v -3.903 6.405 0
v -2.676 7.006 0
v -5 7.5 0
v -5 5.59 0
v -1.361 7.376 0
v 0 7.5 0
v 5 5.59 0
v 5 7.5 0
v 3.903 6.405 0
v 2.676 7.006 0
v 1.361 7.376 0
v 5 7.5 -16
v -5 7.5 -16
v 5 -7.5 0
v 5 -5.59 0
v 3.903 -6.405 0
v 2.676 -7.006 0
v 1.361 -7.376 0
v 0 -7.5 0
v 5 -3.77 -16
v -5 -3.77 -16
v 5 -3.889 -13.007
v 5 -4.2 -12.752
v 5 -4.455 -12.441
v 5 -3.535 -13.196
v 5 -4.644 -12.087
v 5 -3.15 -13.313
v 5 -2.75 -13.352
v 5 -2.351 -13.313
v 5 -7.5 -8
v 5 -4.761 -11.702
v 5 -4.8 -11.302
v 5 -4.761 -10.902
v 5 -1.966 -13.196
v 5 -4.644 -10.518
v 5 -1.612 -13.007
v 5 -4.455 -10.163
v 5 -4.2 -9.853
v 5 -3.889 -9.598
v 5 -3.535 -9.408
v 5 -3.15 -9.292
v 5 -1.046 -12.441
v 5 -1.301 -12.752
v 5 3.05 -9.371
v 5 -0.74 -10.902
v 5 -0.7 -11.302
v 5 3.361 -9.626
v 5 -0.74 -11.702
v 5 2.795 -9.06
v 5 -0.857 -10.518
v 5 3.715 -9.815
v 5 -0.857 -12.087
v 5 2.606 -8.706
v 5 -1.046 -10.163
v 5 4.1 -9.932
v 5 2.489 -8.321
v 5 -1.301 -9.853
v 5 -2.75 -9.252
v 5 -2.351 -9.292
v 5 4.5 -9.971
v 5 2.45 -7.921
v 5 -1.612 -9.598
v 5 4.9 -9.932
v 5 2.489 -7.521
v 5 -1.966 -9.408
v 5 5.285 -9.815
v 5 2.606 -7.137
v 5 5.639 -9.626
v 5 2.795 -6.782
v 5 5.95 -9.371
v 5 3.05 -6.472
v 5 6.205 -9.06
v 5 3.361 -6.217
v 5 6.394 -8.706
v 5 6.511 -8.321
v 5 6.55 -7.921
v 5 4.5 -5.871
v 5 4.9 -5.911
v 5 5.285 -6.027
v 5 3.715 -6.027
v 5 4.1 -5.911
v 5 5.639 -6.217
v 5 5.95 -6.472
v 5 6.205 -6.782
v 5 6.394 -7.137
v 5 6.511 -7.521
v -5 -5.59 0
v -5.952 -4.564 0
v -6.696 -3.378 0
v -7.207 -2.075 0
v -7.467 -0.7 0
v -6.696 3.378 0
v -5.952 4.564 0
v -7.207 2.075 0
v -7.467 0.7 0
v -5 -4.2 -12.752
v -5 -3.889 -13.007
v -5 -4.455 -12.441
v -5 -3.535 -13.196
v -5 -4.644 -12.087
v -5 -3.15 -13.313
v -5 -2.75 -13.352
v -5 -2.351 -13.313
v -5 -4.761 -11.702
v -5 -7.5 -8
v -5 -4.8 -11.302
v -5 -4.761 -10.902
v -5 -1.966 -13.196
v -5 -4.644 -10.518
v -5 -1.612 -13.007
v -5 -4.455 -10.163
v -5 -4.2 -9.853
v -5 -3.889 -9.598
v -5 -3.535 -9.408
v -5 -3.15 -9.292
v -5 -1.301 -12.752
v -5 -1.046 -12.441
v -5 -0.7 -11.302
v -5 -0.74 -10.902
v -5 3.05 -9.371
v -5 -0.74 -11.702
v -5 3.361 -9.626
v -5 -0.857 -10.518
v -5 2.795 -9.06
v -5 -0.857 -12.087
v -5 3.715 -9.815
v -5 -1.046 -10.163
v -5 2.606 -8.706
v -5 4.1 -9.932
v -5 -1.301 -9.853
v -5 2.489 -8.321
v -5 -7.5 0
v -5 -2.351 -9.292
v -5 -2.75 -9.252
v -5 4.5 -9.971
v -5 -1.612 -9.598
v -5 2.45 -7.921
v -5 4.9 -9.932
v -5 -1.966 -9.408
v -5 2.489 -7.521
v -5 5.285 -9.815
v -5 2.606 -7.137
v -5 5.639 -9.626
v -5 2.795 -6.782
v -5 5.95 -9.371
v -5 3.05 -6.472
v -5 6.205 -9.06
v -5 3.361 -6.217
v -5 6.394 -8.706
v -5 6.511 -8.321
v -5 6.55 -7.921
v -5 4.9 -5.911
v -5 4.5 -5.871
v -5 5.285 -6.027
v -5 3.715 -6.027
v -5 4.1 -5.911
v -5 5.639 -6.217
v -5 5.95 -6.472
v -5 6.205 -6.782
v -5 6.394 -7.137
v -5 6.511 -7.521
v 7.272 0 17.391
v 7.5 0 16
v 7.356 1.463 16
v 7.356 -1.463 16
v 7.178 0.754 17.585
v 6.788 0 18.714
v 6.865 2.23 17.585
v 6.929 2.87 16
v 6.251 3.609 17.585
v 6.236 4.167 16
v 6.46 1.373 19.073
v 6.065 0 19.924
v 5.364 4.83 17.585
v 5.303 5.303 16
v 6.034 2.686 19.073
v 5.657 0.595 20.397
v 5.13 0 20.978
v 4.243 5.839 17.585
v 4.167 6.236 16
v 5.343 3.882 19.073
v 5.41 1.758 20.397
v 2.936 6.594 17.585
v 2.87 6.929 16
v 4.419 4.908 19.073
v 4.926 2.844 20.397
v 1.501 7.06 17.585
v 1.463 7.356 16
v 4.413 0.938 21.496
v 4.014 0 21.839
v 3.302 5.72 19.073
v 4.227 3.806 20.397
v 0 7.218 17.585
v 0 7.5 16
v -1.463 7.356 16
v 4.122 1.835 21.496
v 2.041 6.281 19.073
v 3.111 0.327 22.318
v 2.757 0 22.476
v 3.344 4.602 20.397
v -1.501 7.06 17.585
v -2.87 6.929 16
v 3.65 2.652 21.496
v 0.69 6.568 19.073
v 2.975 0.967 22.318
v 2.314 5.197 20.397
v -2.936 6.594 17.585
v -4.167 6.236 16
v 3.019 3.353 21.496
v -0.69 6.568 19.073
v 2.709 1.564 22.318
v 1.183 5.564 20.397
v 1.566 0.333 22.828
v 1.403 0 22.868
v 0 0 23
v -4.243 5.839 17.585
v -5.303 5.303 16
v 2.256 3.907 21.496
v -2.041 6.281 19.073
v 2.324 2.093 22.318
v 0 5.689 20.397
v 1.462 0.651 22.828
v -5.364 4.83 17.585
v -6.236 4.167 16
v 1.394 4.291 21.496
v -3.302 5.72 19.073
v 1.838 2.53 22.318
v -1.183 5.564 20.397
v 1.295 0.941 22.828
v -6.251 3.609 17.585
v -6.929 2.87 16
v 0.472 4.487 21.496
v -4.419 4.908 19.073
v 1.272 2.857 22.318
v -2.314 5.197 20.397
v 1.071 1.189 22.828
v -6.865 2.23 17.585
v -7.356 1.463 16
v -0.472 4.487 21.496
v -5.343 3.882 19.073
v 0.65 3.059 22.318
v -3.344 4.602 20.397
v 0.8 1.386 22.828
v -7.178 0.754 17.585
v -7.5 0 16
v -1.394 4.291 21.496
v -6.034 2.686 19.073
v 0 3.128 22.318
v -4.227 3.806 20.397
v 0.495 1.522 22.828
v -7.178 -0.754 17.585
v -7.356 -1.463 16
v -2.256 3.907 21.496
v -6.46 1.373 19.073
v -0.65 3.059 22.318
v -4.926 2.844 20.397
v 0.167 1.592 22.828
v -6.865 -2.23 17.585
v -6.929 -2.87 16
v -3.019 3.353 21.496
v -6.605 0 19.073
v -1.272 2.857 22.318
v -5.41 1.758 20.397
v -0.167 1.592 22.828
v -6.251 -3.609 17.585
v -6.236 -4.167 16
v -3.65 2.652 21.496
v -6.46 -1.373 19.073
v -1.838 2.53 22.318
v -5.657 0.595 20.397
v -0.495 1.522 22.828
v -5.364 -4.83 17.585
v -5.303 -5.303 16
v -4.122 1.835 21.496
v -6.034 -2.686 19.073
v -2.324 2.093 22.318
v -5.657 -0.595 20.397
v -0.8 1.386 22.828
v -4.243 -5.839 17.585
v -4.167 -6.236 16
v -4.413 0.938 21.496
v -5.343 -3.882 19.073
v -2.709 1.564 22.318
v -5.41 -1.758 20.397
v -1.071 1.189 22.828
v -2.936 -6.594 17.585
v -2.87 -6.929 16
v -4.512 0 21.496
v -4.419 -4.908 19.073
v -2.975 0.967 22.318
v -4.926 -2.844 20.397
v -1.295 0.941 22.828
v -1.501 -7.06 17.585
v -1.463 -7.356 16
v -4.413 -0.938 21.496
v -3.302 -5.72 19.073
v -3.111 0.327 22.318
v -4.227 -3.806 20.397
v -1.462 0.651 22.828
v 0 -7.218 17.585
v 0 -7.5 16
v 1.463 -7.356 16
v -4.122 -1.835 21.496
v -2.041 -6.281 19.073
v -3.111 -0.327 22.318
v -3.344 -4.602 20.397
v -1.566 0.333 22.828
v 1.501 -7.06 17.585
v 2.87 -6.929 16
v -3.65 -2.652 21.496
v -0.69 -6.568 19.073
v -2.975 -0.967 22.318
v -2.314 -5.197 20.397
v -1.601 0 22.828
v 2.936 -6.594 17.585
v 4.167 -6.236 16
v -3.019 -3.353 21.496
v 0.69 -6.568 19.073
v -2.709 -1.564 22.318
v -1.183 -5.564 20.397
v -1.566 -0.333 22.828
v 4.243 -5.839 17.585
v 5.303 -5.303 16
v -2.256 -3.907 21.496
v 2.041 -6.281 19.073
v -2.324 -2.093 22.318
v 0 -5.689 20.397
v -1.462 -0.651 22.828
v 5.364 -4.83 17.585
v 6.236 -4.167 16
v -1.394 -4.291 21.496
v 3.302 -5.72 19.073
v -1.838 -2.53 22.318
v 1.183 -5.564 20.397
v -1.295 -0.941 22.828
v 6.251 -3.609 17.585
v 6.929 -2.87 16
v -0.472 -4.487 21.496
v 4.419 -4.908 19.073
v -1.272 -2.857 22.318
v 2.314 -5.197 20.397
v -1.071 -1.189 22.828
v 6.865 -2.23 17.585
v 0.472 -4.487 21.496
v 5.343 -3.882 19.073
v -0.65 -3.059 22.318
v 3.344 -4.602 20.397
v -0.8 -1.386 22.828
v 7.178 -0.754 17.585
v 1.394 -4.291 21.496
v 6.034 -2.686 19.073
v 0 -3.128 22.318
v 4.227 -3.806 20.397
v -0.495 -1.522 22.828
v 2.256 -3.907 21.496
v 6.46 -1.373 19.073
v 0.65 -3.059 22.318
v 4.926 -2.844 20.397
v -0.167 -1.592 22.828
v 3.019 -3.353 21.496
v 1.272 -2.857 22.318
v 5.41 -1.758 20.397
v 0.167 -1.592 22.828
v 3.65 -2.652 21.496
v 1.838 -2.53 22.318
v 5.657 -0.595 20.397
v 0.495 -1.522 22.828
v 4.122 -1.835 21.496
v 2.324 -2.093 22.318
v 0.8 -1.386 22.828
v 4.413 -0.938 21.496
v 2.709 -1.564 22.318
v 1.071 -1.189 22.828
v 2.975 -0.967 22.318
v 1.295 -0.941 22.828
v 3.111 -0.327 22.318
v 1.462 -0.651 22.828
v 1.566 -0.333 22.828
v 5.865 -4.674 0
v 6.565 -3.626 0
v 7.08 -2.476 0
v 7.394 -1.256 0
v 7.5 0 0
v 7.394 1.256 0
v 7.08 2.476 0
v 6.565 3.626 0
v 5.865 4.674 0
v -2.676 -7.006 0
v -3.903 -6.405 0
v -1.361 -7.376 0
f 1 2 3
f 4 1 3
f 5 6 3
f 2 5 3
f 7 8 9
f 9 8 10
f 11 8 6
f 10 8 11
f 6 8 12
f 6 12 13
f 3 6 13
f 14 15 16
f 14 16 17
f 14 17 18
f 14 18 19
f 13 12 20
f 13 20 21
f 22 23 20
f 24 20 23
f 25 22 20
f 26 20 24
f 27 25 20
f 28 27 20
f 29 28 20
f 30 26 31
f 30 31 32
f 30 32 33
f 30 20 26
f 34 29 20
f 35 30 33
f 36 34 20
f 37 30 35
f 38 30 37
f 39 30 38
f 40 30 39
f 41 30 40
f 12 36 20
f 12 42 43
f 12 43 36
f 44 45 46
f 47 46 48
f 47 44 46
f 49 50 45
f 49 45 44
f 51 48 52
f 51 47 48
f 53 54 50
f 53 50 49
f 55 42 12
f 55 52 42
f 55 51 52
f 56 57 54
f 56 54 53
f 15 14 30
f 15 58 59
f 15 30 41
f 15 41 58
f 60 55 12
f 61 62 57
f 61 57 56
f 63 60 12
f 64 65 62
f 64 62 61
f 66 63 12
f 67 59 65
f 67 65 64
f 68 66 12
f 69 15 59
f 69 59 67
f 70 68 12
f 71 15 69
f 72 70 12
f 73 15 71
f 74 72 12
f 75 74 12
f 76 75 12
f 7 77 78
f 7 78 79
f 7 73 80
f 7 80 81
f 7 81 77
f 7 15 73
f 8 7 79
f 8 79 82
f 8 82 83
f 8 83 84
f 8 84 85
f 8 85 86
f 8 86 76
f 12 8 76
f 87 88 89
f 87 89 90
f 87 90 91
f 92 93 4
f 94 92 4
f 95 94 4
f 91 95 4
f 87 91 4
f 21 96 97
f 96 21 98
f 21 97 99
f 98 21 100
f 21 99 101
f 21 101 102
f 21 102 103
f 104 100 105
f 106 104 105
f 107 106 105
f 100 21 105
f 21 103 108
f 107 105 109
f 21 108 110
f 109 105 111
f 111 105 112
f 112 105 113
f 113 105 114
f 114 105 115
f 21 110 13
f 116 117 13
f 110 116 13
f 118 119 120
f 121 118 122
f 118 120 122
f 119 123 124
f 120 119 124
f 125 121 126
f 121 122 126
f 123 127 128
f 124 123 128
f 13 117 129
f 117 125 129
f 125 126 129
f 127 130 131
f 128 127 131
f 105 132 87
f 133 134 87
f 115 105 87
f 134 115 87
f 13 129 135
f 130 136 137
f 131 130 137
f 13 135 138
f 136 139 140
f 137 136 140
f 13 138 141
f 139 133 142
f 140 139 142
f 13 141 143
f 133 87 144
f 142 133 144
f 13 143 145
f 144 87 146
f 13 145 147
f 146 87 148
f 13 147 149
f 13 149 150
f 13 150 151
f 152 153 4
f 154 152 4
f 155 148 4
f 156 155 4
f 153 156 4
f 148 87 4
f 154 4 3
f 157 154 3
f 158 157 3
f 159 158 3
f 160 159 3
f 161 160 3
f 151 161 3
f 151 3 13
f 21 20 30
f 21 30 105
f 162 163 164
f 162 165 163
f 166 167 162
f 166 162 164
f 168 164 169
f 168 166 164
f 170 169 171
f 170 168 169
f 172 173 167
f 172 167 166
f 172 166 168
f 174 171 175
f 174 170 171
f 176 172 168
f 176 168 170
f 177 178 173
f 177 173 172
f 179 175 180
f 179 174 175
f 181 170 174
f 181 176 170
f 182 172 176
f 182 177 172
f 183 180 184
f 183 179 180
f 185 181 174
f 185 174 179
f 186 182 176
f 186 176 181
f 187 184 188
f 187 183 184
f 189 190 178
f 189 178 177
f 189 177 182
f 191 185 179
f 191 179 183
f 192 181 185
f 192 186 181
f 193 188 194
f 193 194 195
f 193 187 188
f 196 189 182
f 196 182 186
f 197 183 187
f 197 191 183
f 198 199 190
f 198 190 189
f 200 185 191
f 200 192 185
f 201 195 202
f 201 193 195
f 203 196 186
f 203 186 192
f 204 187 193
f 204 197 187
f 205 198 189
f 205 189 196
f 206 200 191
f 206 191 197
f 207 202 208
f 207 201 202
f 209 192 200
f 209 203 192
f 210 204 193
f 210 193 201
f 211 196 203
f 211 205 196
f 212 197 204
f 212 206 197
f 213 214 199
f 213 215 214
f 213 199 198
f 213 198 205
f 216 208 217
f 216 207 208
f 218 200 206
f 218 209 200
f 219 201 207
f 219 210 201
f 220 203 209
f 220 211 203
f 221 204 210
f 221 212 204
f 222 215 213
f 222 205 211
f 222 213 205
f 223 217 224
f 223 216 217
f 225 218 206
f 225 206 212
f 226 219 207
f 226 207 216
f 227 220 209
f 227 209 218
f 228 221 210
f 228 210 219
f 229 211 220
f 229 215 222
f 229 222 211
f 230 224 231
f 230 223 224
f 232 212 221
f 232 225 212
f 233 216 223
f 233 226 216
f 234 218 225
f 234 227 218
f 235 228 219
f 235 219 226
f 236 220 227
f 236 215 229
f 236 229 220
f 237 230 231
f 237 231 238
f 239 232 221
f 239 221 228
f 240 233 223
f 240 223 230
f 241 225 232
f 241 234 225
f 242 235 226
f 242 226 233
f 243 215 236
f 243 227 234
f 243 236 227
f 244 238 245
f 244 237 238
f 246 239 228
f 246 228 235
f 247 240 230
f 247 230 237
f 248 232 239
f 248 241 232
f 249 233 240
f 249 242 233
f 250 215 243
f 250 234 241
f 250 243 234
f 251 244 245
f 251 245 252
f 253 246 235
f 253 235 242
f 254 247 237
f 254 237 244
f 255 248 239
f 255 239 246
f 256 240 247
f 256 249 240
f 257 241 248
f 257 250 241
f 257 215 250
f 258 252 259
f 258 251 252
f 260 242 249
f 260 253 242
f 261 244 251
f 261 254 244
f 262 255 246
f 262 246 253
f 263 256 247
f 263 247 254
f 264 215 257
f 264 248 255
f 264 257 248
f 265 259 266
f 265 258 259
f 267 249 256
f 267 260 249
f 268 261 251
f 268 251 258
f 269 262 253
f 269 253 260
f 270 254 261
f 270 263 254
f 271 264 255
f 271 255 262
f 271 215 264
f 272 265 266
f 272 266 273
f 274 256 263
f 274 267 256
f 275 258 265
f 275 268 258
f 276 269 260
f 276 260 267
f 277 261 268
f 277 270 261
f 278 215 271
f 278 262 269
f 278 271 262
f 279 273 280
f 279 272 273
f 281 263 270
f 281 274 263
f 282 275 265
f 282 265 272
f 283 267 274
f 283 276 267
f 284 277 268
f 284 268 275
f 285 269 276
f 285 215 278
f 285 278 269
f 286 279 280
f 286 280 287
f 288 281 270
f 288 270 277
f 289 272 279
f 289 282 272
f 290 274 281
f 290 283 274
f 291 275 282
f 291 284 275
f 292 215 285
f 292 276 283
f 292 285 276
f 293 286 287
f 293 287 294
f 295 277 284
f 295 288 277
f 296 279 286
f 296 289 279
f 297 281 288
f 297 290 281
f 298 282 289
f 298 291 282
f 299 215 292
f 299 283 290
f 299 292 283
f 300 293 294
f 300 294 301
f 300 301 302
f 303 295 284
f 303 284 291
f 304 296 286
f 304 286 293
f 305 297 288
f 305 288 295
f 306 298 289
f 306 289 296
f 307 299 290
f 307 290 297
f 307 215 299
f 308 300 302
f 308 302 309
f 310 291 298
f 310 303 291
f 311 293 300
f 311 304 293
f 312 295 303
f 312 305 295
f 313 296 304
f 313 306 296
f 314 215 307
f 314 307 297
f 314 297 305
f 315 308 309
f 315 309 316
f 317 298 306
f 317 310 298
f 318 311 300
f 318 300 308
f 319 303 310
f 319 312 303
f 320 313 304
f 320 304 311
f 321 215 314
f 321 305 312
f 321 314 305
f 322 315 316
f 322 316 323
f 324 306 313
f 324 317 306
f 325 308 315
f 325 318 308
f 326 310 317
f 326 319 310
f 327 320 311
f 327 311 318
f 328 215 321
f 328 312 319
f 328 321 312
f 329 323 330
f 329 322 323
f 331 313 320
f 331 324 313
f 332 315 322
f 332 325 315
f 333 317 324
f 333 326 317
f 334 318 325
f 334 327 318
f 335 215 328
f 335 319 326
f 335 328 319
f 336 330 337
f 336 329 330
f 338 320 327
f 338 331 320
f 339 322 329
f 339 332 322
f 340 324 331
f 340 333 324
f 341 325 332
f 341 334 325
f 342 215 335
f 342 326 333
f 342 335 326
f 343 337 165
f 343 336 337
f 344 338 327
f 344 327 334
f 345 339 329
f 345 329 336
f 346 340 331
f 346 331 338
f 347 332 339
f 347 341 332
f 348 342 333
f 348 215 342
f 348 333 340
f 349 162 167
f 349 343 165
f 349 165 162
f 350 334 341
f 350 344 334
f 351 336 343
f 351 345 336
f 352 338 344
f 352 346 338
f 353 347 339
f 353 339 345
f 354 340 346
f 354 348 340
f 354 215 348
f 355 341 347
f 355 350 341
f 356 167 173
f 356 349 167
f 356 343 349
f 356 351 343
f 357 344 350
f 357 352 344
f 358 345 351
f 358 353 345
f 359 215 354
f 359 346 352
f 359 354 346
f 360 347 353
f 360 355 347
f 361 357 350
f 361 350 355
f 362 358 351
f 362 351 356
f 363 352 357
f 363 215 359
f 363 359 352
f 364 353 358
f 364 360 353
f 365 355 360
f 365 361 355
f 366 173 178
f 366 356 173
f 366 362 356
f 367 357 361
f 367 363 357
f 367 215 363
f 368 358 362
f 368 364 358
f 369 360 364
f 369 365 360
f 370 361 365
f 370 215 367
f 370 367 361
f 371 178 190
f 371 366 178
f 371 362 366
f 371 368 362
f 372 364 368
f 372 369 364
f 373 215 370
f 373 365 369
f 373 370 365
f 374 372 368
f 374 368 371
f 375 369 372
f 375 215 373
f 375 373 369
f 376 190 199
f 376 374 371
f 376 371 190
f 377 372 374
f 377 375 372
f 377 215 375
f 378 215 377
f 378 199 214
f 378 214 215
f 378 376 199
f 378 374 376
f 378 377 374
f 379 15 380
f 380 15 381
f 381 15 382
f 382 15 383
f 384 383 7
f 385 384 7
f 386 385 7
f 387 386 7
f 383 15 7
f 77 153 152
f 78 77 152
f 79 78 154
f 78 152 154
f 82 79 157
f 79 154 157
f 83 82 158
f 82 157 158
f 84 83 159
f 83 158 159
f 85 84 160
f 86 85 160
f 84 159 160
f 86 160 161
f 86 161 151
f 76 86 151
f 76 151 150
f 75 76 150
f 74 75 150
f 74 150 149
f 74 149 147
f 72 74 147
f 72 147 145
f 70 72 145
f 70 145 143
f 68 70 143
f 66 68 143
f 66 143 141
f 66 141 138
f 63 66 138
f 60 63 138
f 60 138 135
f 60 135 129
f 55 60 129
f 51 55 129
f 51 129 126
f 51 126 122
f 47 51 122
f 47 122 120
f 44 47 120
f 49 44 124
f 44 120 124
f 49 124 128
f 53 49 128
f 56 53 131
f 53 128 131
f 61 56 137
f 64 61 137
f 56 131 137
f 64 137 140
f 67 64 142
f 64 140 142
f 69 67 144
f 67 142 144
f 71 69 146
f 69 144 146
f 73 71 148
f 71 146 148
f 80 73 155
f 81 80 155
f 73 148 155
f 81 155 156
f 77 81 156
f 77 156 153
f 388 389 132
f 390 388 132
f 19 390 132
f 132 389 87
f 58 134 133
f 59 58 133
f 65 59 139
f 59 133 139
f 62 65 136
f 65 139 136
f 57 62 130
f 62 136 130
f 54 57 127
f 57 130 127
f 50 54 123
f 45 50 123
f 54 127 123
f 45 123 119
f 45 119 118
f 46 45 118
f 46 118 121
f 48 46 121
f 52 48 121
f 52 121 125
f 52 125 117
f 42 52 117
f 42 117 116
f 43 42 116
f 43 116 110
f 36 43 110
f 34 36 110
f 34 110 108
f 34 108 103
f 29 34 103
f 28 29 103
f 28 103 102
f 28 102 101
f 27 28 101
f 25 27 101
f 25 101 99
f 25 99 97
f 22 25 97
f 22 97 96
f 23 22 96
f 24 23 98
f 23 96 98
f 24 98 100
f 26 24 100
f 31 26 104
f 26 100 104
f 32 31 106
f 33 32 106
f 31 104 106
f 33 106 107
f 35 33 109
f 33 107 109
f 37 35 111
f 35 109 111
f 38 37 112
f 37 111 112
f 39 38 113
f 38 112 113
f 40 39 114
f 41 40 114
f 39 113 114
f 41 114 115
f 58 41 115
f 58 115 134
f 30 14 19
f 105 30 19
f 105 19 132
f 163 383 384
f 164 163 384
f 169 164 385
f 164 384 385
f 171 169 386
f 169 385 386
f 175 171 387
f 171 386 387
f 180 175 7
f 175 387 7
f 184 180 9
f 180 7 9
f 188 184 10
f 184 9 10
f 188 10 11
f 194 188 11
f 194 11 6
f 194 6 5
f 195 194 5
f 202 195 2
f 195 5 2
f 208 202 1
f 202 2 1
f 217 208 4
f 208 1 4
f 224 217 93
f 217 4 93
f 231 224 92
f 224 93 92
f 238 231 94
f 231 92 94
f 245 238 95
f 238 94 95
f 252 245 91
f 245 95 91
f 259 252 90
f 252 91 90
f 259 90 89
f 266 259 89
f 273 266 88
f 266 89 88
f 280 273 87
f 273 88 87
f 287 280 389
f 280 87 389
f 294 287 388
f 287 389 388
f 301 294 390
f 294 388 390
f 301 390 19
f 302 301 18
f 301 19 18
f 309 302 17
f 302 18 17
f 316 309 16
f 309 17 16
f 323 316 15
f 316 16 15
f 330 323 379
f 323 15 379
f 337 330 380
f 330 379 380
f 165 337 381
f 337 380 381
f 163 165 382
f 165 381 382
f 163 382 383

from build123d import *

# Parameters (mm, degrees)
SKETCH_2_R         = 7.5
EXTRUDE_1_DEPTH    = 16
DOME_1_FACE_RADIUS = 7.5
DOME_1_HEIGHT      = 7
SKETCH_3_W         = 10
SKETCH_3_H         = 15
EXTRUDE_2_DEPTH    = 16
CHAMFER_1_SIZE     = 8
CHAMFER_1_SIZE2    = 3.730461265
HOLE_WIZARD_M4_1_D = 4.1


with BuildPart() as part:
    # 草图2 → 凸台-拉伸1 (new body)
    with BuildSketch(Plane.XY):
        Circle(SKETCH_2_R)
    extrude(amount=EXTRUDE_1_DEPTH)

    # 圆顶1: a dome of height H over a round flat face of radius A is a cap of a sphere of radius (A * A + H * H) / (2 * H)
    dome_1_r = (DOME_1_FACE_RADIUS * DOME_1_FACE_RADIUS + DOME_1_HEIGHT * DOME_1_HEIGHT) / (2 * DOME_1_HEIGHT)
    dome_1_base = Plane((0, 0, 16), z_dir=(0, 0, 1))
    with Locations(dome_1_base.offset(DOME_1_HEIGHT - dome_1_r)):
        dome_1_ball = Sphere(dome_1_r, mode=Mode.PRIVATE)
    add(split(dome_1_ball, bisect_by=dome_1_base, keep=Keep.TOP, mode=Mode.PRIVATE))

    # 草图3 → 凸台-拉伸2 (add)
    with BuildSketch(Plane(origin=(0, 0, 0), x_dir=(-1, 0, 0), z_dir=(0, 0, -1))):
        Rectangle(SKETCH_3_W, SKETCH_3_H)
    extrude(amount=EXTRUDE_2_DEPTH)

    # 倒角1
    chamfer_1_edges = [part.edges().sort_by_distance(p)[0] for p in [
        (0, -7.5, -16),
    ]]
    chamfer_1_side = [part.faces().sort_by_distance(p)[0] for p in [
        (0, -7.5, -8),
    ]]
    chamfer(chamfer_1_edges, length=CHAMFER_1_SIZE, length2=CHAMFER_1_SIZE2, reference=chamfer_1_side[0])

    # M4 间隙孔1 (through all)
    with Locations(Plane(origin=(5, 0, 0), x_dir=(0, 0, -1), z_dir=(1, 0, 0))):
        with Locations((7.921197697, 4.5), (11.302143791, -2.750462296)):
            Hole(HOLE_WIZARD_M4_1_D / 2)


solid = part.part
